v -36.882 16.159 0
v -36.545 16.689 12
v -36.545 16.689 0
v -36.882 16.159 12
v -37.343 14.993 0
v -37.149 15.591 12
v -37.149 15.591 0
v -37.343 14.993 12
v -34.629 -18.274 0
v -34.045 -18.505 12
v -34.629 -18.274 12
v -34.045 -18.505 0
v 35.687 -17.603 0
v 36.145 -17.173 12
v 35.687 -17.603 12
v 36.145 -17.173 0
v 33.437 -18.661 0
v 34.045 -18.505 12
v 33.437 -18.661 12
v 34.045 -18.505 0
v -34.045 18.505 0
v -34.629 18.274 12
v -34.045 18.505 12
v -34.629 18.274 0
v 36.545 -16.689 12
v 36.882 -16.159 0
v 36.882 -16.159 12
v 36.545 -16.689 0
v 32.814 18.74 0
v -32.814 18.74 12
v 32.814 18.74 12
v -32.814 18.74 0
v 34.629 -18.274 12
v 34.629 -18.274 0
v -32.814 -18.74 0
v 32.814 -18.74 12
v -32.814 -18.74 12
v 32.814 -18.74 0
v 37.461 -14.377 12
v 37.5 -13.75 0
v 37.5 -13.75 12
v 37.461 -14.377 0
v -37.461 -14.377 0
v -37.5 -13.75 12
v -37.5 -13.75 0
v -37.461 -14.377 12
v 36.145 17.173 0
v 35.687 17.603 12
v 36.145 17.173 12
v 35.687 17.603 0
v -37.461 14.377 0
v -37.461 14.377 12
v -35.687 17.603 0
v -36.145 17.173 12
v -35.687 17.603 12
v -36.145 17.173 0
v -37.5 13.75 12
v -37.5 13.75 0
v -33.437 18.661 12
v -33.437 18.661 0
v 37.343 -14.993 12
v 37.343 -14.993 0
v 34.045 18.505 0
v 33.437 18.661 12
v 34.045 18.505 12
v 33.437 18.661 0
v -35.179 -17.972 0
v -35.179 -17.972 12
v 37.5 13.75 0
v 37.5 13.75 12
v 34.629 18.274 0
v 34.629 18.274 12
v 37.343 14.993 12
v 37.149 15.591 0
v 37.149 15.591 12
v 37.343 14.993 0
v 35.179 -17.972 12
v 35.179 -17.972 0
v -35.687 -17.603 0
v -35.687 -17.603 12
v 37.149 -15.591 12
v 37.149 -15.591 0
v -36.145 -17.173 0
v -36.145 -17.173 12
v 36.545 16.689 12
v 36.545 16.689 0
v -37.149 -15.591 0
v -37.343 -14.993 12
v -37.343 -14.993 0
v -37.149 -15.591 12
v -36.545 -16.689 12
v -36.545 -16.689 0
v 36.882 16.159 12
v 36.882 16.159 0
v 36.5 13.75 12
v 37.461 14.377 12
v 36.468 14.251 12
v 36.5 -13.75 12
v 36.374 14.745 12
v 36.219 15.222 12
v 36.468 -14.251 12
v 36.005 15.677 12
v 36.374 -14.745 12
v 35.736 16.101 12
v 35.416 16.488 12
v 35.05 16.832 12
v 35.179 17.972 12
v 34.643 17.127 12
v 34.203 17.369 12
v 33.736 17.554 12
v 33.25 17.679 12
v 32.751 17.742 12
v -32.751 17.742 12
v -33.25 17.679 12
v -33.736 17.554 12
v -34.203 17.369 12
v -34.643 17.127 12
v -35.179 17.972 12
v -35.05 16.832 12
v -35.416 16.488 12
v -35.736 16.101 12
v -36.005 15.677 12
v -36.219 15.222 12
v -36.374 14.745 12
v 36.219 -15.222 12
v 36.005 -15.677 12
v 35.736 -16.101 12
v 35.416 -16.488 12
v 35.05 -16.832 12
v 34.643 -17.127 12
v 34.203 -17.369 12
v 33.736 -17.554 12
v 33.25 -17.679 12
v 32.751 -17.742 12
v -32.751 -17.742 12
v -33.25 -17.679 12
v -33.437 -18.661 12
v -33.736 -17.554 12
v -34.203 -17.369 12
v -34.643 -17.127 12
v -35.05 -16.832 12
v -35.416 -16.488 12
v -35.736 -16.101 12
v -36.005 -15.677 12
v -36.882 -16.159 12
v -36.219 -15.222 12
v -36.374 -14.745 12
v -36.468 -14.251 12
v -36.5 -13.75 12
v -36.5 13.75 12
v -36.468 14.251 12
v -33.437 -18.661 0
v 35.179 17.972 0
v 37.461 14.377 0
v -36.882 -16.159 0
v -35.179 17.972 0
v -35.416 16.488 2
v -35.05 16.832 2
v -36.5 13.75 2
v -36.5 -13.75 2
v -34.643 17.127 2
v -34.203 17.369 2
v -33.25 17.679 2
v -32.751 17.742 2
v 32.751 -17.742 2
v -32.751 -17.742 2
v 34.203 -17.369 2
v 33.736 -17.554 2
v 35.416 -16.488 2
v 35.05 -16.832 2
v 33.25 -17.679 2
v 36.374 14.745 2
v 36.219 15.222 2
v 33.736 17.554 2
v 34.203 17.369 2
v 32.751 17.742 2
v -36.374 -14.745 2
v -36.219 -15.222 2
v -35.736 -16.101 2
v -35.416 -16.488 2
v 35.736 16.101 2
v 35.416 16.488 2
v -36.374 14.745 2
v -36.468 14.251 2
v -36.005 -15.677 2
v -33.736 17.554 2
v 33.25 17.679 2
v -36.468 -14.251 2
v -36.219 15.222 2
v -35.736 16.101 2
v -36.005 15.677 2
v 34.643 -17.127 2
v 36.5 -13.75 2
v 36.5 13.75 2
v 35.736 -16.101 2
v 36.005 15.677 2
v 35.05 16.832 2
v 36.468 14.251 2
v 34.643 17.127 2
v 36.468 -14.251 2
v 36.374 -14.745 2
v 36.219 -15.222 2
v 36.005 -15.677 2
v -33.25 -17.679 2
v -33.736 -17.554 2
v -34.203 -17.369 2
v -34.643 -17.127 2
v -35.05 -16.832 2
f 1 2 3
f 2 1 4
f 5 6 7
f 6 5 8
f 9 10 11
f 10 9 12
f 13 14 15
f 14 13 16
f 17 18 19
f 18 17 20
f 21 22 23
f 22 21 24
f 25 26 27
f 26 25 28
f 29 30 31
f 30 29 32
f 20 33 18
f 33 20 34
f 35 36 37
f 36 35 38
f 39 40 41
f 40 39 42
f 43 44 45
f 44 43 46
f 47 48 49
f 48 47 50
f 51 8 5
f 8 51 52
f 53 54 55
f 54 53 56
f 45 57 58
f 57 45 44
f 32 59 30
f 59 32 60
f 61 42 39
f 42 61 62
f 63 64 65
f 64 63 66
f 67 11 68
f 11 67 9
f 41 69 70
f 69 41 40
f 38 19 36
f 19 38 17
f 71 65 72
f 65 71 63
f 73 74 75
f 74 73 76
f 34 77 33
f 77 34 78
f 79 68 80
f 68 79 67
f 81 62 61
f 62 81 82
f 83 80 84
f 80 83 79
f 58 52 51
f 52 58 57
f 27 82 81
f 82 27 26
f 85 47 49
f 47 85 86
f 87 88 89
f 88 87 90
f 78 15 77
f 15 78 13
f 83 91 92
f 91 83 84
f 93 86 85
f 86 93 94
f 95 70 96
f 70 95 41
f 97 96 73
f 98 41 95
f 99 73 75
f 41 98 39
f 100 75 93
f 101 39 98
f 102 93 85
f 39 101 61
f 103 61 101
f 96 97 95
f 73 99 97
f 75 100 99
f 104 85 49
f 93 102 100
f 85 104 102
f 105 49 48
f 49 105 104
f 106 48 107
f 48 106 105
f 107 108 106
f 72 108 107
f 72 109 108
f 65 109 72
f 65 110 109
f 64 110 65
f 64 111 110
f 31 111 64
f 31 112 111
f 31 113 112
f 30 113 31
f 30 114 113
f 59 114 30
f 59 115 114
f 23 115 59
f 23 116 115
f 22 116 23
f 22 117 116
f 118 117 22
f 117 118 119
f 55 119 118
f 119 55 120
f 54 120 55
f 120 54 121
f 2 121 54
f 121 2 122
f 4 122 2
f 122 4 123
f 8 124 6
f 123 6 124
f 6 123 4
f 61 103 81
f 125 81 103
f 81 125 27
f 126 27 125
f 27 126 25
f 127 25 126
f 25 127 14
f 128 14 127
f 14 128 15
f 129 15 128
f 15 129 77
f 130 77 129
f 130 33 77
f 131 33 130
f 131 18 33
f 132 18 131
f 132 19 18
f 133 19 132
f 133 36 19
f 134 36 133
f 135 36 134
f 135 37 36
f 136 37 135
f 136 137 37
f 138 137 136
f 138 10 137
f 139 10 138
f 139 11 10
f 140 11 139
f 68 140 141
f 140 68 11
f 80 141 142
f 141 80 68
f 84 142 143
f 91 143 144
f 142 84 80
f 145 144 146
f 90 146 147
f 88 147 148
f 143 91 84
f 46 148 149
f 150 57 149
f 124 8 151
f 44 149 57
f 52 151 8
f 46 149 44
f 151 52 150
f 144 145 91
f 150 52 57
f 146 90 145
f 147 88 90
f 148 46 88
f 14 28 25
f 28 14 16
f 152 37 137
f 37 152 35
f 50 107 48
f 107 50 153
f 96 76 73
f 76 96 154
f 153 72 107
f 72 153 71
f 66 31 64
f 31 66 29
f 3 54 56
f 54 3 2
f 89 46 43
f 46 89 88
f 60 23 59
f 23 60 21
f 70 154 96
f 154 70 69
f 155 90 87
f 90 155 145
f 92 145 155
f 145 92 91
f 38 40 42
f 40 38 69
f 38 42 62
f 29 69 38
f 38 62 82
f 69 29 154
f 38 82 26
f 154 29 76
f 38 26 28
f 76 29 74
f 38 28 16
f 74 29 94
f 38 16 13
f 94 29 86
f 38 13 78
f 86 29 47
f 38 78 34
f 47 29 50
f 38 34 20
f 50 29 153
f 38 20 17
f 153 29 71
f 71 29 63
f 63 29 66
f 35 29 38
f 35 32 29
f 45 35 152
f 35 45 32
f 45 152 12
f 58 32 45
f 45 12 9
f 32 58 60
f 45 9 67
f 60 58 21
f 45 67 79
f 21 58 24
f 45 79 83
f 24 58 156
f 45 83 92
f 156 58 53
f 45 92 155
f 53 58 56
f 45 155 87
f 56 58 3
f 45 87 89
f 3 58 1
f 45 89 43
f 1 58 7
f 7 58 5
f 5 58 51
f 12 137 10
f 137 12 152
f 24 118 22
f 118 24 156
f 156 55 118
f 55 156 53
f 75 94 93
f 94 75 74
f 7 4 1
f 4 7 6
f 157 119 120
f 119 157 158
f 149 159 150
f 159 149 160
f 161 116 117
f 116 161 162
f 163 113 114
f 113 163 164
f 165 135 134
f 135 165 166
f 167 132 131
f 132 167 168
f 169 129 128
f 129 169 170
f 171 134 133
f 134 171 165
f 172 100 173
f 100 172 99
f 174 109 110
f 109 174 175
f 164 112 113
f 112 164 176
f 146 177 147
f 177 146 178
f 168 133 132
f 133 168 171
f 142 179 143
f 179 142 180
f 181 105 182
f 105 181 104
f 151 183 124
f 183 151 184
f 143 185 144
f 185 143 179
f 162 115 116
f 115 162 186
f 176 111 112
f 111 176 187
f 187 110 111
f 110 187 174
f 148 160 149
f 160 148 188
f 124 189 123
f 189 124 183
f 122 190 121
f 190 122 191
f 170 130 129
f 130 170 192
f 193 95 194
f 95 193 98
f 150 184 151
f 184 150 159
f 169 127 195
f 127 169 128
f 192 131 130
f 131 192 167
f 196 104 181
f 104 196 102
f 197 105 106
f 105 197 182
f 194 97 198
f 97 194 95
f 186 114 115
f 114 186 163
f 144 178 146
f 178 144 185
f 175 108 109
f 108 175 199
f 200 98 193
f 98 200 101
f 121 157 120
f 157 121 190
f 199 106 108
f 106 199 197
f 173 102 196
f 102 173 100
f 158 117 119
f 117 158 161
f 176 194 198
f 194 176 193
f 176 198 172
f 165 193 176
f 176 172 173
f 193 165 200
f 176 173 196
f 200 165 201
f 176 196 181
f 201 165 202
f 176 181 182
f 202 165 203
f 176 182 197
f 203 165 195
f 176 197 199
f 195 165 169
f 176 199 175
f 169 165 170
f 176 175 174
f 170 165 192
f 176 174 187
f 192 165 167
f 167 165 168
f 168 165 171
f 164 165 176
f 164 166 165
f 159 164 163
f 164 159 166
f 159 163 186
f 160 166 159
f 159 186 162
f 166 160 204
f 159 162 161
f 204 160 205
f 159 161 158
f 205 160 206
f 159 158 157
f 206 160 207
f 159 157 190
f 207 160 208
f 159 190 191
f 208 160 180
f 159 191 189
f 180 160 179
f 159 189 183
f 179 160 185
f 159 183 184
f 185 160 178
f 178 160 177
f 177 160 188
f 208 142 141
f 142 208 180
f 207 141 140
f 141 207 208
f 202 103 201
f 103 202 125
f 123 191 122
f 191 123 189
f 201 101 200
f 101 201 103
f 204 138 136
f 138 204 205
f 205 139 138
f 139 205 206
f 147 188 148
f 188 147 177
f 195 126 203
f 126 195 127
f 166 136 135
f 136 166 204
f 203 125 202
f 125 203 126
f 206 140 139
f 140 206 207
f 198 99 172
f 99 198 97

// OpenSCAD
$fn = 50;


difference() {
	union() {
		hull() {
			translate(v = [-32.5000000000, 13.7500000000, 0]) {
				cylinder(h = 12, r = 5);
			}
			translate(v = [32.5000000000, 13.7500000000, 0]) {
				cylinder(h = 12, r = 5);
			}
			translate(v = [-32.5000000000, -13.7500000000, 0]) {
				cylinder(h = 12, r = 5);
			}
			translate(v = [32.5000000000, -13.7500000000, 0]) {
				cylinder(h = 12, r = 5);
			}
		}
	}
	union() {
		translate(v = [0, 0, 2]) {
			hull() {
				translate(v = [-32.5000000000, 13.7500000000, 0]) {
					cylinder(h = 10, r = 4);
				}
				translate(v = [32.5000000000, 13.7500000000, 0]) {
					cylinder(h = 10, r = 4);
				}
				translate(v = [-32.5000000000, -13.7500000000, 0]) {
					cylinder(h = 10, r = 4);
				}
				translate(v = [32.5000000000, -13.7500000000, 0]) {
					cylinder(h = 10, r = 4);
				}
			}
		}
	}
}
